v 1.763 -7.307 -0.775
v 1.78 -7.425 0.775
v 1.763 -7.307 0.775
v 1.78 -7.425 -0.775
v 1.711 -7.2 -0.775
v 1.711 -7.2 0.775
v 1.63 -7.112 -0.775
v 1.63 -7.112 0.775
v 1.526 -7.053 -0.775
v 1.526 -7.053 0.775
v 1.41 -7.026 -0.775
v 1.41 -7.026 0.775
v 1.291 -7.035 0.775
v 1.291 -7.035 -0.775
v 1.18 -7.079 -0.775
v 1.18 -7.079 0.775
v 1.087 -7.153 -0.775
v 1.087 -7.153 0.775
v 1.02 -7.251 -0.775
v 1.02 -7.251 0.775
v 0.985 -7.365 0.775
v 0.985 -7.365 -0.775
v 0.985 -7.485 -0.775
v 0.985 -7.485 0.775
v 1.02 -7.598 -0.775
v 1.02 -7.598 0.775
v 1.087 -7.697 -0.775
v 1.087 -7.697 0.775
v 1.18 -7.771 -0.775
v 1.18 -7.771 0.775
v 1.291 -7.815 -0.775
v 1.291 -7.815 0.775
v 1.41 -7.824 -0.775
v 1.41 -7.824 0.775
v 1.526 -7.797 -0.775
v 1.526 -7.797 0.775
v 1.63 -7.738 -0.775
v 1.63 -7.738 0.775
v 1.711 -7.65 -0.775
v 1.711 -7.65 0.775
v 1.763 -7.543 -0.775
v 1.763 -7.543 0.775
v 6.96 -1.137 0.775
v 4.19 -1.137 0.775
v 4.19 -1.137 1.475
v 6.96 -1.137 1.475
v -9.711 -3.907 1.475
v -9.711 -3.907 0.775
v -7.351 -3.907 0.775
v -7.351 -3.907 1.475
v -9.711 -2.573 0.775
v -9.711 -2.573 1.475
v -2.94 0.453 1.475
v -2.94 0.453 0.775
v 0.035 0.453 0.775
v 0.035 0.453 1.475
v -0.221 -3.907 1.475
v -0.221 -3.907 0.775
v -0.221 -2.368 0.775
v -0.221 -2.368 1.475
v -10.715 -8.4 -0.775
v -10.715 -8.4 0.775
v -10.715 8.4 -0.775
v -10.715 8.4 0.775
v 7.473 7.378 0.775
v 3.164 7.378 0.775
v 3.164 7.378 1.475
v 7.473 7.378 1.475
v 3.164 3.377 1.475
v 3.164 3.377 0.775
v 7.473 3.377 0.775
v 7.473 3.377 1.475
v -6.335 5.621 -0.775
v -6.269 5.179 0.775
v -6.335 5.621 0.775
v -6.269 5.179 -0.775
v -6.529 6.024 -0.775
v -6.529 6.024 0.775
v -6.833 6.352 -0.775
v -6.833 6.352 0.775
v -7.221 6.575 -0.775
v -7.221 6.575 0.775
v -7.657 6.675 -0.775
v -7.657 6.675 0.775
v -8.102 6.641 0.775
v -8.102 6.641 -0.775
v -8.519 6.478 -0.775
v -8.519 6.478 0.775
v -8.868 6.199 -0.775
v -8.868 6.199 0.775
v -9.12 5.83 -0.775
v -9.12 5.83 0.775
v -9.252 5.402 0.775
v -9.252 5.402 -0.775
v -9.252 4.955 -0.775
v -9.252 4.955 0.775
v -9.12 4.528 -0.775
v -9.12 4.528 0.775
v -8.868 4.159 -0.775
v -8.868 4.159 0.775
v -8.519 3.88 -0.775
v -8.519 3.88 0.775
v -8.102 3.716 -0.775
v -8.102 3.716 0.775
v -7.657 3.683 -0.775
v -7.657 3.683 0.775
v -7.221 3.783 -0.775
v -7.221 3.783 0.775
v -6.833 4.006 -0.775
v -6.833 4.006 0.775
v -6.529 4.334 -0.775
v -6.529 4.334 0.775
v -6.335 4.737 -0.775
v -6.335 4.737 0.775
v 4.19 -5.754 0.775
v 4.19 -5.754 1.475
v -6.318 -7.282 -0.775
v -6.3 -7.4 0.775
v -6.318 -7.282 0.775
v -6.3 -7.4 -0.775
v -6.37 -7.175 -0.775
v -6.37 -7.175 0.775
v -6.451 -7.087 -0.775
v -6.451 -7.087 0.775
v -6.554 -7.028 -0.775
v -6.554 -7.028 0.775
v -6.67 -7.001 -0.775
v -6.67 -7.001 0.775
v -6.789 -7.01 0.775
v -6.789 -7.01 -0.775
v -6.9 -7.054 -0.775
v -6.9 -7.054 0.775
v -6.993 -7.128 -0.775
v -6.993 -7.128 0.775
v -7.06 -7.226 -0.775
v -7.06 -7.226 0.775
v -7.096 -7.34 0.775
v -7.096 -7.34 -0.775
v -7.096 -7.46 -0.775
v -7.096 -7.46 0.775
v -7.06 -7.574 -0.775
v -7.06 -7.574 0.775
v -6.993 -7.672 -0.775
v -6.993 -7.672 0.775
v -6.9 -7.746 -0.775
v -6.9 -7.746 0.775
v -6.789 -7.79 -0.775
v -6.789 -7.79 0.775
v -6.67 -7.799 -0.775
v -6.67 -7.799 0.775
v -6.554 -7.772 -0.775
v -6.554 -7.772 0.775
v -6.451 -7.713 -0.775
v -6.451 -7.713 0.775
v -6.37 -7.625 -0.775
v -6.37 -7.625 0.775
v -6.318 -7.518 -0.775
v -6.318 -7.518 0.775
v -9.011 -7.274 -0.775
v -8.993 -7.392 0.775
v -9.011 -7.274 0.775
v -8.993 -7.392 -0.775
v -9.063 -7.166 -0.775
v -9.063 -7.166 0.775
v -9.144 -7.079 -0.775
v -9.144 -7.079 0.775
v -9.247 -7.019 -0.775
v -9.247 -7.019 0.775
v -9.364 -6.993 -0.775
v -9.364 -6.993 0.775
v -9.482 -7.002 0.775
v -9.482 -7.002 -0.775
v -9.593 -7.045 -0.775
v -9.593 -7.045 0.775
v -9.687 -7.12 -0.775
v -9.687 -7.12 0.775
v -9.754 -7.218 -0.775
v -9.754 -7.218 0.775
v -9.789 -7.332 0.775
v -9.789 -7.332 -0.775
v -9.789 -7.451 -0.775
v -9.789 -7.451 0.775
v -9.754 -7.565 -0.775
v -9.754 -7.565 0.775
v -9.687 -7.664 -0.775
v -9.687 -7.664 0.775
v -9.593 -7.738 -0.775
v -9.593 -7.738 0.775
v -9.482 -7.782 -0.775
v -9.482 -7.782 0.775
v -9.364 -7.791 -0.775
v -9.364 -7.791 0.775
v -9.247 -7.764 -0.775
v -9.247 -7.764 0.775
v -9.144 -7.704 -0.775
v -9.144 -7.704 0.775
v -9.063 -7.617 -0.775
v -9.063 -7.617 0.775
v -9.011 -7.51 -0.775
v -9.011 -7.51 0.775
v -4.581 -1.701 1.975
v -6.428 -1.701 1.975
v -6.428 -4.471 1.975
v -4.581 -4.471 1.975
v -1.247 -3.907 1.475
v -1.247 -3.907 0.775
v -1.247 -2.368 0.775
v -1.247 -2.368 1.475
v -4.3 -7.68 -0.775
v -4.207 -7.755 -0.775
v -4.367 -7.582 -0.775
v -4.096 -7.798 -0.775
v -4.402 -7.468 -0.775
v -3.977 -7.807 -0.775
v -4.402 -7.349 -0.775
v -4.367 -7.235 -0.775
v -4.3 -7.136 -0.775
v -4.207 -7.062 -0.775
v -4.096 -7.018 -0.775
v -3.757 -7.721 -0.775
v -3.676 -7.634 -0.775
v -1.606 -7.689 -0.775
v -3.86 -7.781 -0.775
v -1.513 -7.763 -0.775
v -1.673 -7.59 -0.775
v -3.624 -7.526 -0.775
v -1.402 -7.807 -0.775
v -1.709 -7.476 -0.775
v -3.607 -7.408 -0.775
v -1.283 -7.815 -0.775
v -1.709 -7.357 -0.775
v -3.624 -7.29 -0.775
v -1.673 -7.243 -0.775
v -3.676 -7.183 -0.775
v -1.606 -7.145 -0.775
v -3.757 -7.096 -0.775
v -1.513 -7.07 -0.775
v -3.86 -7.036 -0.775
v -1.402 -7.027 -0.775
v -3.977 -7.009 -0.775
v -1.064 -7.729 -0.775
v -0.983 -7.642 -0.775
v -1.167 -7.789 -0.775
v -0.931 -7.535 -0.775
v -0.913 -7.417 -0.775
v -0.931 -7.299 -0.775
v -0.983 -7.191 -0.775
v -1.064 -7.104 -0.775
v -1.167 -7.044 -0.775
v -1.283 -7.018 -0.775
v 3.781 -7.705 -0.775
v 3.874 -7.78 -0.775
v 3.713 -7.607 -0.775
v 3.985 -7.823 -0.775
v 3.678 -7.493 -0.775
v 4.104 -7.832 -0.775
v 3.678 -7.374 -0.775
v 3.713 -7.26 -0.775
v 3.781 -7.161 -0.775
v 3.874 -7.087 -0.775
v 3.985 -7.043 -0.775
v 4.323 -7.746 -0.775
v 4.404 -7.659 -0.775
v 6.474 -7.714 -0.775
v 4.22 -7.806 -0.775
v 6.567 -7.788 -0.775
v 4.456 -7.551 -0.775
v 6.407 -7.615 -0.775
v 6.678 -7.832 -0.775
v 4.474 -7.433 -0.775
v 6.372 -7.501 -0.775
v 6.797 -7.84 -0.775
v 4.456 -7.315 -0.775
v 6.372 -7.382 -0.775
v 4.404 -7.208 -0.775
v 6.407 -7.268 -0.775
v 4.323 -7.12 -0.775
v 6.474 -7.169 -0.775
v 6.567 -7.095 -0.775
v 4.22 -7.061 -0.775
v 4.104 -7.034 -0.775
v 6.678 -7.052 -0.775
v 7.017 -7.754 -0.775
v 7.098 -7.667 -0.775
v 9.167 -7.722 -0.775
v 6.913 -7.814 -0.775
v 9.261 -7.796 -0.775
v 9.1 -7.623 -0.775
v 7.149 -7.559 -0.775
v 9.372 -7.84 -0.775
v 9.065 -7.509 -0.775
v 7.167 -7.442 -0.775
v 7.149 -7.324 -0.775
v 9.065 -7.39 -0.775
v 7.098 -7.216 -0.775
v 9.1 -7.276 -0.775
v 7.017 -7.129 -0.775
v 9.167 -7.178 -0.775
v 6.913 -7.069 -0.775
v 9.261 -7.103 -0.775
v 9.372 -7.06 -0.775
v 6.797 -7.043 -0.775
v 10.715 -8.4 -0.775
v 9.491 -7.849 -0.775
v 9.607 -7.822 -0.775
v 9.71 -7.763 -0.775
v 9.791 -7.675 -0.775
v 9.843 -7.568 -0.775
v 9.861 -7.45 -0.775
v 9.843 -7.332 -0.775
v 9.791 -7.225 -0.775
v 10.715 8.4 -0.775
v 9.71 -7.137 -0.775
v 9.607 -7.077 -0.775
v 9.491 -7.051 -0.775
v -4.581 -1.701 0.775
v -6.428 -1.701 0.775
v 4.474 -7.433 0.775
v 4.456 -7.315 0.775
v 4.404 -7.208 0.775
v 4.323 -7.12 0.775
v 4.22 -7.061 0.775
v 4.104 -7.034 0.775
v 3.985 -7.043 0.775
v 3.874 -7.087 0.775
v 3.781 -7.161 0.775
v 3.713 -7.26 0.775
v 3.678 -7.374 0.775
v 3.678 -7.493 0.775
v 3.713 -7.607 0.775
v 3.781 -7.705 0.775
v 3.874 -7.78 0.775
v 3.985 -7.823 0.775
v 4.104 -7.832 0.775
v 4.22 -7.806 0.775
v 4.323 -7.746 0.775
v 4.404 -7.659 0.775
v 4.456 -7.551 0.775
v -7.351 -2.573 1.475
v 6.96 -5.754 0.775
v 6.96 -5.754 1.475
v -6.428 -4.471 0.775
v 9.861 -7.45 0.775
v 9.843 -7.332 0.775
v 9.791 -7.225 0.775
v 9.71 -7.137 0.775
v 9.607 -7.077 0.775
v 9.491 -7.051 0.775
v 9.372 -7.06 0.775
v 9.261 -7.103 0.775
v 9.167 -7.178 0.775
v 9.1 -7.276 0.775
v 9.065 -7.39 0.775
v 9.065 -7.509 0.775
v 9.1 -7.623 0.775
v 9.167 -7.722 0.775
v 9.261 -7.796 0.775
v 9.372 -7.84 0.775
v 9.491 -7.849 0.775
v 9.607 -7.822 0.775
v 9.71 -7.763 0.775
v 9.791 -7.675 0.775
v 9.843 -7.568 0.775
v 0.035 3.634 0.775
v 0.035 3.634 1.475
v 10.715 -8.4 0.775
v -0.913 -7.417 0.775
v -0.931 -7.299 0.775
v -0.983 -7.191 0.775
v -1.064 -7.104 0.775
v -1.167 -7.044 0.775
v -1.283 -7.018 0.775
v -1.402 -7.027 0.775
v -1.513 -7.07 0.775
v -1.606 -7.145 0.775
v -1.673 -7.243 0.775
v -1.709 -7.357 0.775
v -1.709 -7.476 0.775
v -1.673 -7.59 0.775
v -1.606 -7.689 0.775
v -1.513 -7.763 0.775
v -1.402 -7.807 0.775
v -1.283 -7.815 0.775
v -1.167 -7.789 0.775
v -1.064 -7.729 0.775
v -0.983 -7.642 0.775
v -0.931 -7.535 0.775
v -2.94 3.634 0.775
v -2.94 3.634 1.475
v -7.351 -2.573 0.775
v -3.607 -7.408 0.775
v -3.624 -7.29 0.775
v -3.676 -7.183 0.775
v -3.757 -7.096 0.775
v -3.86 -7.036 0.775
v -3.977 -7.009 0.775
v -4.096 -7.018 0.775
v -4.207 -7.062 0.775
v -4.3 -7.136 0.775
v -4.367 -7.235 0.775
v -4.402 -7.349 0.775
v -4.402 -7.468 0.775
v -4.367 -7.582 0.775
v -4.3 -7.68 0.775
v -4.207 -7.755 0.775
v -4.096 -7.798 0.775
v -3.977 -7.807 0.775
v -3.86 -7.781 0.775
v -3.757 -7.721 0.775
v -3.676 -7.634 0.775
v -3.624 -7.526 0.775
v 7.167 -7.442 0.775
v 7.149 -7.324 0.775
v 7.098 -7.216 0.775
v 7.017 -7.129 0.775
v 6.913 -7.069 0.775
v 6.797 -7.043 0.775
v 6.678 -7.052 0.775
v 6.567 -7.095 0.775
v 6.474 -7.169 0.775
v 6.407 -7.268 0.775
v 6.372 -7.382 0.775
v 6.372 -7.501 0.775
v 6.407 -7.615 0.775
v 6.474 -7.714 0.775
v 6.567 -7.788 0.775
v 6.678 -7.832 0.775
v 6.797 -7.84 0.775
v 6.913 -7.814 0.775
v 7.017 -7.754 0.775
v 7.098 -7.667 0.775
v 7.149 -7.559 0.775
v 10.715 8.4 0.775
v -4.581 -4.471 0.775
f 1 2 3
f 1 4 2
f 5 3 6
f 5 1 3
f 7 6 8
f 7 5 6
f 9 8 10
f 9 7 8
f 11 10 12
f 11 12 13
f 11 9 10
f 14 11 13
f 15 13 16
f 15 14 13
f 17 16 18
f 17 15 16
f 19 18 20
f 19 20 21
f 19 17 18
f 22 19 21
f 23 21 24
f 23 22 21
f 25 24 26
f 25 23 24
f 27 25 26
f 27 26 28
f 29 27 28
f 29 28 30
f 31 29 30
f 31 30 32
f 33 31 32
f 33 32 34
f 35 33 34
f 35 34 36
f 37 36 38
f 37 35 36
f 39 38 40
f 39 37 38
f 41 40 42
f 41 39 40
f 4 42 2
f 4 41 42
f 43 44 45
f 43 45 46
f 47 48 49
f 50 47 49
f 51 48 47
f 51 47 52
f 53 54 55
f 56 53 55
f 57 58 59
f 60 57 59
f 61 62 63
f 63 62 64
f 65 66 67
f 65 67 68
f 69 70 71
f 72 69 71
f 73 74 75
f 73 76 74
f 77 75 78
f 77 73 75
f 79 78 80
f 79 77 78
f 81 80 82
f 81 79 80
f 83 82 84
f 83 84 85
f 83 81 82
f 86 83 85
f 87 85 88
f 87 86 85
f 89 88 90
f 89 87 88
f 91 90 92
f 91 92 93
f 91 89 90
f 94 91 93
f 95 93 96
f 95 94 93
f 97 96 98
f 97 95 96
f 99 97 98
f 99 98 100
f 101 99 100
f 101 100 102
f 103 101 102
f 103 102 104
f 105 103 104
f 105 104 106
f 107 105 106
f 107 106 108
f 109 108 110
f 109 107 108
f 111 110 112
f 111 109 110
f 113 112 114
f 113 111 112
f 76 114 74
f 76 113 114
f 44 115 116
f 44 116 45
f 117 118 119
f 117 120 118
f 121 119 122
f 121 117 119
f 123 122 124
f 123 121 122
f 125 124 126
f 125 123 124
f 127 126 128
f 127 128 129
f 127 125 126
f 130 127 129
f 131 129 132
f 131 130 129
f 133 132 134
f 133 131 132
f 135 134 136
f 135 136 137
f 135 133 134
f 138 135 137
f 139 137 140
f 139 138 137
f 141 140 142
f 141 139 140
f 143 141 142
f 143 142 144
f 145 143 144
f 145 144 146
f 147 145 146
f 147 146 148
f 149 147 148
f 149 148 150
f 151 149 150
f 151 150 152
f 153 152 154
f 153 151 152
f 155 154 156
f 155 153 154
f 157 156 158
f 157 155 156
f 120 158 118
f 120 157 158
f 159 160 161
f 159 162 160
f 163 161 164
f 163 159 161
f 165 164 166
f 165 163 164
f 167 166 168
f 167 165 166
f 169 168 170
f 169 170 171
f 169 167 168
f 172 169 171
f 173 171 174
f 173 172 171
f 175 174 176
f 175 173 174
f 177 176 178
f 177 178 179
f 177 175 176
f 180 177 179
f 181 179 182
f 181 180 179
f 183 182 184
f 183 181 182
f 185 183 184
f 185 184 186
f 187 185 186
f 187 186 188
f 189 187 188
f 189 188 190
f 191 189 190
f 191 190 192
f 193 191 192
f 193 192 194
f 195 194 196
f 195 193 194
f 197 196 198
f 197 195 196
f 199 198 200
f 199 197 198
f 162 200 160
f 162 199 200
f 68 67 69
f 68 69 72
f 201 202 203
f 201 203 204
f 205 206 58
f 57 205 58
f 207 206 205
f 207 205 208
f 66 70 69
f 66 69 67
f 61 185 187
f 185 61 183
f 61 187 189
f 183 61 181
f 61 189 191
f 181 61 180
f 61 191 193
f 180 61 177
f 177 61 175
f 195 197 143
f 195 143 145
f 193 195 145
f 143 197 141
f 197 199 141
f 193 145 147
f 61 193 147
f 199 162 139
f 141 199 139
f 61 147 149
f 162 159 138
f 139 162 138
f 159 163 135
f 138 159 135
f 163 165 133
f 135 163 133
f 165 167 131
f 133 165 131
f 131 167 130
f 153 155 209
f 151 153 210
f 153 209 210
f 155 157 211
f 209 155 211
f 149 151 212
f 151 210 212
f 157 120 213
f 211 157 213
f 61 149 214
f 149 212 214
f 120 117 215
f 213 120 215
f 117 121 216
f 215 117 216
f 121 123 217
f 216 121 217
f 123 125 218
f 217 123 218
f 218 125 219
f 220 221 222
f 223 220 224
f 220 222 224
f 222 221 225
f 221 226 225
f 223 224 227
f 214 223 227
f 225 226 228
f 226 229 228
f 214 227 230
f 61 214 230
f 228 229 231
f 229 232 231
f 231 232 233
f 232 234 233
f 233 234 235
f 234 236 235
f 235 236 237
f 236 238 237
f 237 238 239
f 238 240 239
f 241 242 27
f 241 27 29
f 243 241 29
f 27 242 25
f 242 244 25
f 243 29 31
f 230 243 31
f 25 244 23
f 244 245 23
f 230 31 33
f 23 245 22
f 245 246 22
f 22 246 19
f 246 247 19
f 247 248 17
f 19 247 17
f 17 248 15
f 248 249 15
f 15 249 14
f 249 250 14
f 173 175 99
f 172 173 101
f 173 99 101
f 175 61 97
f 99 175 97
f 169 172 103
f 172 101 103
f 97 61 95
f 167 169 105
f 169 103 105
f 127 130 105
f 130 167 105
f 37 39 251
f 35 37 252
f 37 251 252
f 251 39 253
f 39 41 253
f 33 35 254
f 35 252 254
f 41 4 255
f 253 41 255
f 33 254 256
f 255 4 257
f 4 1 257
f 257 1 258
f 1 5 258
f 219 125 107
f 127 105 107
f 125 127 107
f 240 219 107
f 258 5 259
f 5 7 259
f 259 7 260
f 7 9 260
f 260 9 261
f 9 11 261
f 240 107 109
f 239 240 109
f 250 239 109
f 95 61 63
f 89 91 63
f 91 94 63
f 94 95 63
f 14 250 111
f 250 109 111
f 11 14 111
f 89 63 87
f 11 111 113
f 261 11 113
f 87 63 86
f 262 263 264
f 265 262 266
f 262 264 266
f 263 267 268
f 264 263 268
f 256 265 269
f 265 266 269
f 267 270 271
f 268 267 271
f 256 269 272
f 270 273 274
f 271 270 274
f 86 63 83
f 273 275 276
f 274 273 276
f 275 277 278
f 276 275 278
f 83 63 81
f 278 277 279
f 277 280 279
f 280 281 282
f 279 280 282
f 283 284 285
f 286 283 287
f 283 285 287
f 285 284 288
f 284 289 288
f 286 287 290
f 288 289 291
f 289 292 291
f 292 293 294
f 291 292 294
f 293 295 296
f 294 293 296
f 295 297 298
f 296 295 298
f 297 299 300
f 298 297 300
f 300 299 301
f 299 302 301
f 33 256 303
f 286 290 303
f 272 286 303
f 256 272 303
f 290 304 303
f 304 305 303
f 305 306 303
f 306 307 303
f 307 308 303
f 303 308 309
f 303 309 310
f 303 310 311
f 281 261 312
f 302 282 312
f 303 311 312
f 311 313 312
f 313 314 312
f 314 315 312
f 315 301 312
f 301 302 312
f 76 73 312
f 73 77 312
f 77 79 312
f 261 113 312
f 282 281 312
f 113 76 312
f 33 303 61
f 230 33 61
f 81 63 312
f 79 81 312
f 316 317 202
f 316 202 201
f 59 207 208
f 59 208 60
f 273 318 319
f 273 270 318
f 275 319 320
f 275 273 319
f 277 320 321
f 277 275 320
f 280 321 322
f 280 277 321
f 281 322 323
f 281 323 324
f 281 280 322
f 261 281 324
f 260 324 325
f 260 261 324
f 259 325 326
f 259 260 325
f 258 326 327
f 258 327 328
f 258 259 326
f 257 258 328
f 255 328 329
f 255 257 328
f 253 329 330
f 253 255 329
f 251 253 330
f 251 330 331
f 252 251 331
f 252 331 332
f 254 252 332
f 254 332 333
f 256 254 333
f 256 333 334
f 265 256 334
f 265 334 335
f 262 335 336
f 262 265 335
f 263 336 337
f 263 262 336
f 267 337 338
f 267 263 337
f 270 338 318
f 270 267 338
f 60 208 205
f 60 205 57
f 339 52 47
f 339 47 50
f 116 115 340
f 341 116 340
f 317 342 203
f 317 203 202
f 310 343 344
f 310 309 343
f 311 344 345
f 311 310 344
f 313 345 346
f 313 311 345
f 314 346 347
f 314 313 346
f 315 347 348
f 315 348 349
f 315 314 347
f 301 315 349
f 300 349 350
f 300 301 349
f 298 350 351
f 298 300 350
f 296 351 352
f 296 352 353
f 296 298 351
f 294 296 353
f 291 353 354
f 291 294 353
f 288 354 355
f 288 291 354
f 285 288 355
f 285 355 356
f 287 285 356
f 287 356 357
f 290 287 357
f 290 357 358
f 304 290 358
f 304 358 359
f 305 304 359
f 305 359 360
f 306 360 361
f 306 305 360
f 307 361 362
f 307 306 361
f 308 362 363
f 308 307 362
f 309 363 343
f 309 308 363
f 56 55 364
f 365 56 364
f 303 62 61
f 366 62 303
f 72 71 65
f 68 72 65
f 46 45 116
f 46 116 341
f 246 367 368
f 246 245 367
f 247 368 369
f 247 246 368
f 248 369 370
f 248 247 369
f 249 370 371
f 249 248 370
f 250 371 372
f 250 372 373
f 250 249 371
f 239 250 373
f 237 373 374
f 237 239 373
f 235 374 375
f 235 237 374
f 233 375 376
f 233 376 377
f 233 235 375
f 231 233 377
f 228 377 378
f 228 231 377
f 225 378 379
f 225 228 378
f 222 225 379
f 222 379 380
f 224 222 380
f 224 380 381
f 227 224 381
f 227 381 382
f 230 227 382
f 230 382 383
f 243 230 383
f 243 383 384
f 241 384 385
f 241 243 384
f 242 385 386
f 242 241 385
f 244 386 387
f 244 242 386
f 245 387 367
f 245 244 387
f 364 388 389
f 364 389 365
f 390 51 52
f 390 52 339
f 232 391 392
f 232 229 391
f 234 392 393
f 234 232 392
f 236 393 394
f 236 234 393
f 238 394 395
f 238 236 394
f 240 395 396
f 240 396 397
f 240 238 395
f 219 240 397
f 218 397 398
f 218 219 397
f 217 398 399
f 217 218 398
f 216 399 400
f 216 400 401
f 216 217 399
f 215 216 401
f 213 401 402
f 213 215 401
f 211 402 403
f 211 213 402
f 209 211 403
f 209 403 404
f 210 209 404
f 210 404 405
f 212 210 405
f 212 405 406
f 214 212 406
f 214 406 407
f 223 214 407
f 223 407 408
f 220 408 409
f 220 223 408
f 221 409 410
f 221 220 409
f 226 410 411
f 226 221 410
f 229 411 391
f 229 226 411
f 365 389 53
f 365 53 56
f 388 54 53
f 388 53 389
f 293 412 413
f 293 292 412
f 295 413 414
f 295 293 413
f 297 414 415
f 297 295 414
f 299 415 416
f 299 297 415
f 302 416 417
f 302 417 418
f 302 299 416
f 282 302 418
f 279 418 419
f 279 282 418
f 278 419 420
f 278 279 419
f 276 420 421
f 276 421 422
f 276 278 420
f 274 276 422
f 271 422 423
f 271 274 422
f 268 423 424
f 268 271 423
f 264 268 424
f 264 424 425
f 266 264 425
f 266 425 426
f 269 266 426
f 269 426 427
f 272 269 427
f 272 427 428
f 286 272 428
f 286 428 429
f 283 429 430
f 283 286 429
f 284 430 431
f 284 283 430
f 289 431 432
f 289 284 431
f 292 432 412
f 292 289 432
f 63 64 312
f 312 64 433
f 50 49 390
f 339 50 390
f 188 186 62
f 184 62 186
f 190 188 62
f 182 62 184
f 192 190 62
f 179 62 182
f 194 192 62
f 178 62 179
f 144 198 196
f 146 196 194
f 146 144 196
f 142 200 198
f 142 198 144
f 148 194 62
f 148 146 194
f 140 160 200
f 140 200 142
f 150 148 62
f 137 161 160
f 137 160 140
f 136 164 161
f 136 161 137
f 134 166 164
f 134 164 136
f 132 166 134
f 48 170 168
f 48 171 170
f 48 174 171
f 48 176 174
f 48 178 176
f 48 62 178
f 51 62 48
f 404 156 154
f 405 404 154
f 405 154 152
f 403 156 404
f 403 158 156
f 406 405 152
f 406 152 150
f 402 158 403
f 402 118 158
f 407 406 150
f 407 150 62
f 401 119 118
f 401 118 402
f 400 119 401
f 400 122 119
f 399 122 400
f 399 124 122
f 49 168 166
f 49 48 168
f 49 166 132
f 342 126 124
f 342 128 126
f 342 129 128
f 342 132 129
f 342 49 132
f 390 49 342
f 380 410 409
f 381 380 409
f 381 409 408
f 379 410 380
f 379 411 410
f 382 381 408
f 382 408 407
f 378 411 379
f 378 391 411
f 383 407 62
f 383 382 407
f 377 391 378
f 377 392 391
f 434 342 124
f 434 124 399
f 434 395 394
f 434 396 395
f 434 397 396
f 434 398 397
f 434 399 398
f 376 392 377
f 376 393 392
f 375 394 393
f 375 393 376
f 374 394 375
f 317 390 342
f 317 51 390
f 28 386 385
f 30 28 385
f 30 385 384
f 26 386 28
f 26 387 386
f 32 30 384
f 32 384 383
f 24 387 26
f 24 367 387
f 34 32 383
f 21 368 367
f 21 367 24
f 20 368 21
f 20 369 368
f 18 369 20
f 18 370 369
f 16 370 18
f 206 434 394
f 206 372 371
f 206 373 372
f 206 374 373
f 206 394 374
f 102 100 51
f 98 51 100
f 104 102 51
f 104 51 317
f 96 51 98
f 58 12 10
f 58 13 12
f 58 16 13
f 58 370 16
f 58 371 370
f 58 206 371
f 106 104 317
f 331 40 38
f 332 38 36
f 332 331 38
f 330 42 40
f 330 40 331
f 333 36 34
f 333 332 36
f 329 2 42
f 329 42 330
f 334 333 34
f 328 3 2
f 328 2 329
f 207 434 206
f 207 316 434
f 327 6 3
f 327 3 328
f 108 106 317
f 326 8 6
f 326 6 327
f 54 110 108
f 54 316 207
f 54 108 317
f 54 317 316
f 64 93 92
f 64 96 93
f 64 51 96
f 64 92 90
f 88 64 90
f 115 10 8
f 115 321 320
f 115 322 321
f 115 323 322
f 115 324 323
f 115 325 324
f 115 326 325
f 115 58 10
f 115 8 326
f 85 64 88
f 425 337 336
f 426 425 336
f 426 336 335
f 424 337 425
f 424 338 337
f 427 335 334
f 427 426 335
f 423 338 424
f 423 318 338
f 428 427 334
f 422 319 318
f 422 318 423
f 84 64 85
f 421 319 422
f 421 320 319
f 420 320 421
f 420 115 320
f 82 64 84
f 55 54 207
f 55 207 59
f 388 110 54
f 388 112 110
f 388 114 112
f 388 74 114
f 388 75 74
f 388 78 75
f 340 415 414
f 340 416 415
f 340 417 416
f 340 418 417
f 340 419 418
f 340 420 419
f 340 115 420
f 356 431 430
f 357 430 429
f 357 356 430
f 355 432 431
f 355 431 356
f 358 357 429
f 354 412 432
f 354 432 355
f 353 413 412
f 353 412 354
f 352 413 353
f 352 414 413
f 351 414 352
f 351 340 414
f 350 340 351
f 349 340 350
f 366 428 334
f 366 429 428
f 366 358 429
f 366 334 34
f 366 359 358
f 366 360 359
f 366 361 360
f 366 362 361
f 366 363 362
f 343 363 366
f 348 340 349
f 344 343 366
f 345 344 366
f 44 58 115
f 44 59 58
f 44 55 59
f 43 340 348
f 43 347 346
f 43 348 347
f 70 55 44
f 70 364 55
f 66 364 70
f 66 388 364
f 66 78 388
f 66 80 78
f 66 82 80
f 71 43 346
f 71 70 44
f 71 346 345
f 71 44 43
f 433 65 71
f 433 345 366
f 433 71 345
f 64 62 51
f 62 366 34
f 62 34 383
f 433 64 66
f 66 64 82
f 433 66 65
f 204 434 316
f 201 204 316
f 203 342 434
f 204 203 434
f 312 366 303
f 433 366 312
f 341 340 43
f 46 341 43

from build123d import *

# Parameters (mm, degrees)
F0_W     = 21.43
F0_H     = 16.8
F0_R     = 0.4
F0_R_2   = 1.5
F1_DEPTH = 0.775
F2_W     = 2.359656
F2_H     = 1.333718
F2_W_2   = 1.025936
F2_H_2   = 1.538906
F2_W_3   = 2.975217
F2_H_3   = 3.180405
F2_W_4   = 2.770032
F2_H_4   = 4.616717
F2_W_5   = 4.308936
F2_H_5   = 4.001155
F3_DEPTH = 0.7
F2_W_6   = 1.846687
F2_H_6   = 2.770031
F4_DEPTH = 1.2


with BuildPart() as f1:
    # F0 (on Top) → F1 (new body, symmetric)
    with BuildSketch(Plane.XY):
        Rectangle(F0_W, F0_H)
        with Locations((-9.393446, -7.391692)):
            Circle(F0_R, mode=Mode.SUBTRACT)
        with Locations((-6.7, -7.4)):
            Circle(F0_R, mode=Mode.SUBTRACT)
        with Locations((-4.006554, -7.408308)):
            Circle(F0_R, mode=Mode.SUBTRACT)
        with Locations((-1.313108, -7.416616)):
            Circle(F0_R, mode=Mode.SUBTRACT)
        with Locations((1.380338, -7.424924)):
            Circle(F0_R, mode=Mode.SUBTRACT)
        with Locations((4.073785, -7.433231)):
            Circle(F0_R, mode=Mode.SUBTRACT)
        with Locations((6.767231, -7.441539)):
            Circle(F0_R, mode=Mode.SUBTRACT)
        with Locations((9.460677, -7.449847)):
            Circle(F0_R, mode=Mode.SUBTRACT)
        with Locations((-7.768597, 5.178844)):
            Circle(F0_R_2, mode=Mode.SUBTRACT)
    extrude(amount=F1_DEPTH, both=True)

    # F2 (on face) → F3 (join)
    with BuildSketch(Plane.XY.offset(0.775)):
        with Locations((-8.531306, -3.239972)):
            Rectangle(F2_W, F2_H)
        with Locations((-0.734184, -3.137378)):
            Rectangle(F2_W_2, F2_H_2)
        with Locations((-1.452339, 2.043604)):
            Rectangle(F2_W_3, F2_H_3)
        with Locations((5.57533, -3.445159)):
            Rectangle(F2_W_4, F2_H_4)
        with Locations((5.318846, 5.3779)):
            Rectangle(F2_W_5, F2_H_5)
    extrude(amount=F3_DEPTH)

    # F2 (on face) → F4 (join)
    with BuildSketch(Plane.XY.offset(0.775)):
        with Locations((-5.504791, -3.086081)):
            Rectangle(F2_W_6, F2_H_6)
    extrude(amount=F4_DEPTH)


solid = f1.part
